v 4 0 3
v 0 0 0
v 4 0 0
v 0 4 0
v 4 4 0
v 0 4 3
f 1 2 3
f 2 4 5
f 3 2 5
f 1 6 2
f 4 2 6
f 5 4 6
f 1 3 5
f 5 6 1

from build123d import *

# Parameters (mm, degrees)
F0_W     = 4
F0_H     = 4
F1_DEPTH = 3
F4_DEPTH = 25
F7_DEPTH = 25


with BuildPart() as f1:
    # F0 (on Top) → F1 (new body)
    with BuildSketch(Plane.XY):
        with Locations((2, 2)):
            Rectangle(F0_W, F0_H)
    extrude(amount=F1_DEPTH)

    # F3 (on 3pt) → F4 (cut)
    with BuildSketch(Plane(origin=(0, 0, 0), x_dir=(0.8574929257, -0.3086974533, 0.4115966043), z_dir=(-0.5144957554, -0.5144957554, 0.6859943406))):
        Polygon((4.6647615159, 1.8), (0, 5), (0, 0), align=None)
    extrude(amount=F4_DEPTH, mode=Mode.SUBTRACT)

    # F6 (on 3pt) → F7 (cut)
    with BuildSketch(Plane(origin=(2.1176470588, 2.1176470588, 2.8235294118), x_dir=(0.8574929257, -0.3086974533, -0.4115966043), z_dir=(-0.5144957554, -0.5144957554, -0.6859943406))):
        Polygon((2.1951818898, 1.8), (-2.4695796261, -1.4), (2.1951818898, -3.2), align=None)
    extrude(amount=-F7_DEPTH, mode=Mode.SUBTRACT)


solid = f1.part
